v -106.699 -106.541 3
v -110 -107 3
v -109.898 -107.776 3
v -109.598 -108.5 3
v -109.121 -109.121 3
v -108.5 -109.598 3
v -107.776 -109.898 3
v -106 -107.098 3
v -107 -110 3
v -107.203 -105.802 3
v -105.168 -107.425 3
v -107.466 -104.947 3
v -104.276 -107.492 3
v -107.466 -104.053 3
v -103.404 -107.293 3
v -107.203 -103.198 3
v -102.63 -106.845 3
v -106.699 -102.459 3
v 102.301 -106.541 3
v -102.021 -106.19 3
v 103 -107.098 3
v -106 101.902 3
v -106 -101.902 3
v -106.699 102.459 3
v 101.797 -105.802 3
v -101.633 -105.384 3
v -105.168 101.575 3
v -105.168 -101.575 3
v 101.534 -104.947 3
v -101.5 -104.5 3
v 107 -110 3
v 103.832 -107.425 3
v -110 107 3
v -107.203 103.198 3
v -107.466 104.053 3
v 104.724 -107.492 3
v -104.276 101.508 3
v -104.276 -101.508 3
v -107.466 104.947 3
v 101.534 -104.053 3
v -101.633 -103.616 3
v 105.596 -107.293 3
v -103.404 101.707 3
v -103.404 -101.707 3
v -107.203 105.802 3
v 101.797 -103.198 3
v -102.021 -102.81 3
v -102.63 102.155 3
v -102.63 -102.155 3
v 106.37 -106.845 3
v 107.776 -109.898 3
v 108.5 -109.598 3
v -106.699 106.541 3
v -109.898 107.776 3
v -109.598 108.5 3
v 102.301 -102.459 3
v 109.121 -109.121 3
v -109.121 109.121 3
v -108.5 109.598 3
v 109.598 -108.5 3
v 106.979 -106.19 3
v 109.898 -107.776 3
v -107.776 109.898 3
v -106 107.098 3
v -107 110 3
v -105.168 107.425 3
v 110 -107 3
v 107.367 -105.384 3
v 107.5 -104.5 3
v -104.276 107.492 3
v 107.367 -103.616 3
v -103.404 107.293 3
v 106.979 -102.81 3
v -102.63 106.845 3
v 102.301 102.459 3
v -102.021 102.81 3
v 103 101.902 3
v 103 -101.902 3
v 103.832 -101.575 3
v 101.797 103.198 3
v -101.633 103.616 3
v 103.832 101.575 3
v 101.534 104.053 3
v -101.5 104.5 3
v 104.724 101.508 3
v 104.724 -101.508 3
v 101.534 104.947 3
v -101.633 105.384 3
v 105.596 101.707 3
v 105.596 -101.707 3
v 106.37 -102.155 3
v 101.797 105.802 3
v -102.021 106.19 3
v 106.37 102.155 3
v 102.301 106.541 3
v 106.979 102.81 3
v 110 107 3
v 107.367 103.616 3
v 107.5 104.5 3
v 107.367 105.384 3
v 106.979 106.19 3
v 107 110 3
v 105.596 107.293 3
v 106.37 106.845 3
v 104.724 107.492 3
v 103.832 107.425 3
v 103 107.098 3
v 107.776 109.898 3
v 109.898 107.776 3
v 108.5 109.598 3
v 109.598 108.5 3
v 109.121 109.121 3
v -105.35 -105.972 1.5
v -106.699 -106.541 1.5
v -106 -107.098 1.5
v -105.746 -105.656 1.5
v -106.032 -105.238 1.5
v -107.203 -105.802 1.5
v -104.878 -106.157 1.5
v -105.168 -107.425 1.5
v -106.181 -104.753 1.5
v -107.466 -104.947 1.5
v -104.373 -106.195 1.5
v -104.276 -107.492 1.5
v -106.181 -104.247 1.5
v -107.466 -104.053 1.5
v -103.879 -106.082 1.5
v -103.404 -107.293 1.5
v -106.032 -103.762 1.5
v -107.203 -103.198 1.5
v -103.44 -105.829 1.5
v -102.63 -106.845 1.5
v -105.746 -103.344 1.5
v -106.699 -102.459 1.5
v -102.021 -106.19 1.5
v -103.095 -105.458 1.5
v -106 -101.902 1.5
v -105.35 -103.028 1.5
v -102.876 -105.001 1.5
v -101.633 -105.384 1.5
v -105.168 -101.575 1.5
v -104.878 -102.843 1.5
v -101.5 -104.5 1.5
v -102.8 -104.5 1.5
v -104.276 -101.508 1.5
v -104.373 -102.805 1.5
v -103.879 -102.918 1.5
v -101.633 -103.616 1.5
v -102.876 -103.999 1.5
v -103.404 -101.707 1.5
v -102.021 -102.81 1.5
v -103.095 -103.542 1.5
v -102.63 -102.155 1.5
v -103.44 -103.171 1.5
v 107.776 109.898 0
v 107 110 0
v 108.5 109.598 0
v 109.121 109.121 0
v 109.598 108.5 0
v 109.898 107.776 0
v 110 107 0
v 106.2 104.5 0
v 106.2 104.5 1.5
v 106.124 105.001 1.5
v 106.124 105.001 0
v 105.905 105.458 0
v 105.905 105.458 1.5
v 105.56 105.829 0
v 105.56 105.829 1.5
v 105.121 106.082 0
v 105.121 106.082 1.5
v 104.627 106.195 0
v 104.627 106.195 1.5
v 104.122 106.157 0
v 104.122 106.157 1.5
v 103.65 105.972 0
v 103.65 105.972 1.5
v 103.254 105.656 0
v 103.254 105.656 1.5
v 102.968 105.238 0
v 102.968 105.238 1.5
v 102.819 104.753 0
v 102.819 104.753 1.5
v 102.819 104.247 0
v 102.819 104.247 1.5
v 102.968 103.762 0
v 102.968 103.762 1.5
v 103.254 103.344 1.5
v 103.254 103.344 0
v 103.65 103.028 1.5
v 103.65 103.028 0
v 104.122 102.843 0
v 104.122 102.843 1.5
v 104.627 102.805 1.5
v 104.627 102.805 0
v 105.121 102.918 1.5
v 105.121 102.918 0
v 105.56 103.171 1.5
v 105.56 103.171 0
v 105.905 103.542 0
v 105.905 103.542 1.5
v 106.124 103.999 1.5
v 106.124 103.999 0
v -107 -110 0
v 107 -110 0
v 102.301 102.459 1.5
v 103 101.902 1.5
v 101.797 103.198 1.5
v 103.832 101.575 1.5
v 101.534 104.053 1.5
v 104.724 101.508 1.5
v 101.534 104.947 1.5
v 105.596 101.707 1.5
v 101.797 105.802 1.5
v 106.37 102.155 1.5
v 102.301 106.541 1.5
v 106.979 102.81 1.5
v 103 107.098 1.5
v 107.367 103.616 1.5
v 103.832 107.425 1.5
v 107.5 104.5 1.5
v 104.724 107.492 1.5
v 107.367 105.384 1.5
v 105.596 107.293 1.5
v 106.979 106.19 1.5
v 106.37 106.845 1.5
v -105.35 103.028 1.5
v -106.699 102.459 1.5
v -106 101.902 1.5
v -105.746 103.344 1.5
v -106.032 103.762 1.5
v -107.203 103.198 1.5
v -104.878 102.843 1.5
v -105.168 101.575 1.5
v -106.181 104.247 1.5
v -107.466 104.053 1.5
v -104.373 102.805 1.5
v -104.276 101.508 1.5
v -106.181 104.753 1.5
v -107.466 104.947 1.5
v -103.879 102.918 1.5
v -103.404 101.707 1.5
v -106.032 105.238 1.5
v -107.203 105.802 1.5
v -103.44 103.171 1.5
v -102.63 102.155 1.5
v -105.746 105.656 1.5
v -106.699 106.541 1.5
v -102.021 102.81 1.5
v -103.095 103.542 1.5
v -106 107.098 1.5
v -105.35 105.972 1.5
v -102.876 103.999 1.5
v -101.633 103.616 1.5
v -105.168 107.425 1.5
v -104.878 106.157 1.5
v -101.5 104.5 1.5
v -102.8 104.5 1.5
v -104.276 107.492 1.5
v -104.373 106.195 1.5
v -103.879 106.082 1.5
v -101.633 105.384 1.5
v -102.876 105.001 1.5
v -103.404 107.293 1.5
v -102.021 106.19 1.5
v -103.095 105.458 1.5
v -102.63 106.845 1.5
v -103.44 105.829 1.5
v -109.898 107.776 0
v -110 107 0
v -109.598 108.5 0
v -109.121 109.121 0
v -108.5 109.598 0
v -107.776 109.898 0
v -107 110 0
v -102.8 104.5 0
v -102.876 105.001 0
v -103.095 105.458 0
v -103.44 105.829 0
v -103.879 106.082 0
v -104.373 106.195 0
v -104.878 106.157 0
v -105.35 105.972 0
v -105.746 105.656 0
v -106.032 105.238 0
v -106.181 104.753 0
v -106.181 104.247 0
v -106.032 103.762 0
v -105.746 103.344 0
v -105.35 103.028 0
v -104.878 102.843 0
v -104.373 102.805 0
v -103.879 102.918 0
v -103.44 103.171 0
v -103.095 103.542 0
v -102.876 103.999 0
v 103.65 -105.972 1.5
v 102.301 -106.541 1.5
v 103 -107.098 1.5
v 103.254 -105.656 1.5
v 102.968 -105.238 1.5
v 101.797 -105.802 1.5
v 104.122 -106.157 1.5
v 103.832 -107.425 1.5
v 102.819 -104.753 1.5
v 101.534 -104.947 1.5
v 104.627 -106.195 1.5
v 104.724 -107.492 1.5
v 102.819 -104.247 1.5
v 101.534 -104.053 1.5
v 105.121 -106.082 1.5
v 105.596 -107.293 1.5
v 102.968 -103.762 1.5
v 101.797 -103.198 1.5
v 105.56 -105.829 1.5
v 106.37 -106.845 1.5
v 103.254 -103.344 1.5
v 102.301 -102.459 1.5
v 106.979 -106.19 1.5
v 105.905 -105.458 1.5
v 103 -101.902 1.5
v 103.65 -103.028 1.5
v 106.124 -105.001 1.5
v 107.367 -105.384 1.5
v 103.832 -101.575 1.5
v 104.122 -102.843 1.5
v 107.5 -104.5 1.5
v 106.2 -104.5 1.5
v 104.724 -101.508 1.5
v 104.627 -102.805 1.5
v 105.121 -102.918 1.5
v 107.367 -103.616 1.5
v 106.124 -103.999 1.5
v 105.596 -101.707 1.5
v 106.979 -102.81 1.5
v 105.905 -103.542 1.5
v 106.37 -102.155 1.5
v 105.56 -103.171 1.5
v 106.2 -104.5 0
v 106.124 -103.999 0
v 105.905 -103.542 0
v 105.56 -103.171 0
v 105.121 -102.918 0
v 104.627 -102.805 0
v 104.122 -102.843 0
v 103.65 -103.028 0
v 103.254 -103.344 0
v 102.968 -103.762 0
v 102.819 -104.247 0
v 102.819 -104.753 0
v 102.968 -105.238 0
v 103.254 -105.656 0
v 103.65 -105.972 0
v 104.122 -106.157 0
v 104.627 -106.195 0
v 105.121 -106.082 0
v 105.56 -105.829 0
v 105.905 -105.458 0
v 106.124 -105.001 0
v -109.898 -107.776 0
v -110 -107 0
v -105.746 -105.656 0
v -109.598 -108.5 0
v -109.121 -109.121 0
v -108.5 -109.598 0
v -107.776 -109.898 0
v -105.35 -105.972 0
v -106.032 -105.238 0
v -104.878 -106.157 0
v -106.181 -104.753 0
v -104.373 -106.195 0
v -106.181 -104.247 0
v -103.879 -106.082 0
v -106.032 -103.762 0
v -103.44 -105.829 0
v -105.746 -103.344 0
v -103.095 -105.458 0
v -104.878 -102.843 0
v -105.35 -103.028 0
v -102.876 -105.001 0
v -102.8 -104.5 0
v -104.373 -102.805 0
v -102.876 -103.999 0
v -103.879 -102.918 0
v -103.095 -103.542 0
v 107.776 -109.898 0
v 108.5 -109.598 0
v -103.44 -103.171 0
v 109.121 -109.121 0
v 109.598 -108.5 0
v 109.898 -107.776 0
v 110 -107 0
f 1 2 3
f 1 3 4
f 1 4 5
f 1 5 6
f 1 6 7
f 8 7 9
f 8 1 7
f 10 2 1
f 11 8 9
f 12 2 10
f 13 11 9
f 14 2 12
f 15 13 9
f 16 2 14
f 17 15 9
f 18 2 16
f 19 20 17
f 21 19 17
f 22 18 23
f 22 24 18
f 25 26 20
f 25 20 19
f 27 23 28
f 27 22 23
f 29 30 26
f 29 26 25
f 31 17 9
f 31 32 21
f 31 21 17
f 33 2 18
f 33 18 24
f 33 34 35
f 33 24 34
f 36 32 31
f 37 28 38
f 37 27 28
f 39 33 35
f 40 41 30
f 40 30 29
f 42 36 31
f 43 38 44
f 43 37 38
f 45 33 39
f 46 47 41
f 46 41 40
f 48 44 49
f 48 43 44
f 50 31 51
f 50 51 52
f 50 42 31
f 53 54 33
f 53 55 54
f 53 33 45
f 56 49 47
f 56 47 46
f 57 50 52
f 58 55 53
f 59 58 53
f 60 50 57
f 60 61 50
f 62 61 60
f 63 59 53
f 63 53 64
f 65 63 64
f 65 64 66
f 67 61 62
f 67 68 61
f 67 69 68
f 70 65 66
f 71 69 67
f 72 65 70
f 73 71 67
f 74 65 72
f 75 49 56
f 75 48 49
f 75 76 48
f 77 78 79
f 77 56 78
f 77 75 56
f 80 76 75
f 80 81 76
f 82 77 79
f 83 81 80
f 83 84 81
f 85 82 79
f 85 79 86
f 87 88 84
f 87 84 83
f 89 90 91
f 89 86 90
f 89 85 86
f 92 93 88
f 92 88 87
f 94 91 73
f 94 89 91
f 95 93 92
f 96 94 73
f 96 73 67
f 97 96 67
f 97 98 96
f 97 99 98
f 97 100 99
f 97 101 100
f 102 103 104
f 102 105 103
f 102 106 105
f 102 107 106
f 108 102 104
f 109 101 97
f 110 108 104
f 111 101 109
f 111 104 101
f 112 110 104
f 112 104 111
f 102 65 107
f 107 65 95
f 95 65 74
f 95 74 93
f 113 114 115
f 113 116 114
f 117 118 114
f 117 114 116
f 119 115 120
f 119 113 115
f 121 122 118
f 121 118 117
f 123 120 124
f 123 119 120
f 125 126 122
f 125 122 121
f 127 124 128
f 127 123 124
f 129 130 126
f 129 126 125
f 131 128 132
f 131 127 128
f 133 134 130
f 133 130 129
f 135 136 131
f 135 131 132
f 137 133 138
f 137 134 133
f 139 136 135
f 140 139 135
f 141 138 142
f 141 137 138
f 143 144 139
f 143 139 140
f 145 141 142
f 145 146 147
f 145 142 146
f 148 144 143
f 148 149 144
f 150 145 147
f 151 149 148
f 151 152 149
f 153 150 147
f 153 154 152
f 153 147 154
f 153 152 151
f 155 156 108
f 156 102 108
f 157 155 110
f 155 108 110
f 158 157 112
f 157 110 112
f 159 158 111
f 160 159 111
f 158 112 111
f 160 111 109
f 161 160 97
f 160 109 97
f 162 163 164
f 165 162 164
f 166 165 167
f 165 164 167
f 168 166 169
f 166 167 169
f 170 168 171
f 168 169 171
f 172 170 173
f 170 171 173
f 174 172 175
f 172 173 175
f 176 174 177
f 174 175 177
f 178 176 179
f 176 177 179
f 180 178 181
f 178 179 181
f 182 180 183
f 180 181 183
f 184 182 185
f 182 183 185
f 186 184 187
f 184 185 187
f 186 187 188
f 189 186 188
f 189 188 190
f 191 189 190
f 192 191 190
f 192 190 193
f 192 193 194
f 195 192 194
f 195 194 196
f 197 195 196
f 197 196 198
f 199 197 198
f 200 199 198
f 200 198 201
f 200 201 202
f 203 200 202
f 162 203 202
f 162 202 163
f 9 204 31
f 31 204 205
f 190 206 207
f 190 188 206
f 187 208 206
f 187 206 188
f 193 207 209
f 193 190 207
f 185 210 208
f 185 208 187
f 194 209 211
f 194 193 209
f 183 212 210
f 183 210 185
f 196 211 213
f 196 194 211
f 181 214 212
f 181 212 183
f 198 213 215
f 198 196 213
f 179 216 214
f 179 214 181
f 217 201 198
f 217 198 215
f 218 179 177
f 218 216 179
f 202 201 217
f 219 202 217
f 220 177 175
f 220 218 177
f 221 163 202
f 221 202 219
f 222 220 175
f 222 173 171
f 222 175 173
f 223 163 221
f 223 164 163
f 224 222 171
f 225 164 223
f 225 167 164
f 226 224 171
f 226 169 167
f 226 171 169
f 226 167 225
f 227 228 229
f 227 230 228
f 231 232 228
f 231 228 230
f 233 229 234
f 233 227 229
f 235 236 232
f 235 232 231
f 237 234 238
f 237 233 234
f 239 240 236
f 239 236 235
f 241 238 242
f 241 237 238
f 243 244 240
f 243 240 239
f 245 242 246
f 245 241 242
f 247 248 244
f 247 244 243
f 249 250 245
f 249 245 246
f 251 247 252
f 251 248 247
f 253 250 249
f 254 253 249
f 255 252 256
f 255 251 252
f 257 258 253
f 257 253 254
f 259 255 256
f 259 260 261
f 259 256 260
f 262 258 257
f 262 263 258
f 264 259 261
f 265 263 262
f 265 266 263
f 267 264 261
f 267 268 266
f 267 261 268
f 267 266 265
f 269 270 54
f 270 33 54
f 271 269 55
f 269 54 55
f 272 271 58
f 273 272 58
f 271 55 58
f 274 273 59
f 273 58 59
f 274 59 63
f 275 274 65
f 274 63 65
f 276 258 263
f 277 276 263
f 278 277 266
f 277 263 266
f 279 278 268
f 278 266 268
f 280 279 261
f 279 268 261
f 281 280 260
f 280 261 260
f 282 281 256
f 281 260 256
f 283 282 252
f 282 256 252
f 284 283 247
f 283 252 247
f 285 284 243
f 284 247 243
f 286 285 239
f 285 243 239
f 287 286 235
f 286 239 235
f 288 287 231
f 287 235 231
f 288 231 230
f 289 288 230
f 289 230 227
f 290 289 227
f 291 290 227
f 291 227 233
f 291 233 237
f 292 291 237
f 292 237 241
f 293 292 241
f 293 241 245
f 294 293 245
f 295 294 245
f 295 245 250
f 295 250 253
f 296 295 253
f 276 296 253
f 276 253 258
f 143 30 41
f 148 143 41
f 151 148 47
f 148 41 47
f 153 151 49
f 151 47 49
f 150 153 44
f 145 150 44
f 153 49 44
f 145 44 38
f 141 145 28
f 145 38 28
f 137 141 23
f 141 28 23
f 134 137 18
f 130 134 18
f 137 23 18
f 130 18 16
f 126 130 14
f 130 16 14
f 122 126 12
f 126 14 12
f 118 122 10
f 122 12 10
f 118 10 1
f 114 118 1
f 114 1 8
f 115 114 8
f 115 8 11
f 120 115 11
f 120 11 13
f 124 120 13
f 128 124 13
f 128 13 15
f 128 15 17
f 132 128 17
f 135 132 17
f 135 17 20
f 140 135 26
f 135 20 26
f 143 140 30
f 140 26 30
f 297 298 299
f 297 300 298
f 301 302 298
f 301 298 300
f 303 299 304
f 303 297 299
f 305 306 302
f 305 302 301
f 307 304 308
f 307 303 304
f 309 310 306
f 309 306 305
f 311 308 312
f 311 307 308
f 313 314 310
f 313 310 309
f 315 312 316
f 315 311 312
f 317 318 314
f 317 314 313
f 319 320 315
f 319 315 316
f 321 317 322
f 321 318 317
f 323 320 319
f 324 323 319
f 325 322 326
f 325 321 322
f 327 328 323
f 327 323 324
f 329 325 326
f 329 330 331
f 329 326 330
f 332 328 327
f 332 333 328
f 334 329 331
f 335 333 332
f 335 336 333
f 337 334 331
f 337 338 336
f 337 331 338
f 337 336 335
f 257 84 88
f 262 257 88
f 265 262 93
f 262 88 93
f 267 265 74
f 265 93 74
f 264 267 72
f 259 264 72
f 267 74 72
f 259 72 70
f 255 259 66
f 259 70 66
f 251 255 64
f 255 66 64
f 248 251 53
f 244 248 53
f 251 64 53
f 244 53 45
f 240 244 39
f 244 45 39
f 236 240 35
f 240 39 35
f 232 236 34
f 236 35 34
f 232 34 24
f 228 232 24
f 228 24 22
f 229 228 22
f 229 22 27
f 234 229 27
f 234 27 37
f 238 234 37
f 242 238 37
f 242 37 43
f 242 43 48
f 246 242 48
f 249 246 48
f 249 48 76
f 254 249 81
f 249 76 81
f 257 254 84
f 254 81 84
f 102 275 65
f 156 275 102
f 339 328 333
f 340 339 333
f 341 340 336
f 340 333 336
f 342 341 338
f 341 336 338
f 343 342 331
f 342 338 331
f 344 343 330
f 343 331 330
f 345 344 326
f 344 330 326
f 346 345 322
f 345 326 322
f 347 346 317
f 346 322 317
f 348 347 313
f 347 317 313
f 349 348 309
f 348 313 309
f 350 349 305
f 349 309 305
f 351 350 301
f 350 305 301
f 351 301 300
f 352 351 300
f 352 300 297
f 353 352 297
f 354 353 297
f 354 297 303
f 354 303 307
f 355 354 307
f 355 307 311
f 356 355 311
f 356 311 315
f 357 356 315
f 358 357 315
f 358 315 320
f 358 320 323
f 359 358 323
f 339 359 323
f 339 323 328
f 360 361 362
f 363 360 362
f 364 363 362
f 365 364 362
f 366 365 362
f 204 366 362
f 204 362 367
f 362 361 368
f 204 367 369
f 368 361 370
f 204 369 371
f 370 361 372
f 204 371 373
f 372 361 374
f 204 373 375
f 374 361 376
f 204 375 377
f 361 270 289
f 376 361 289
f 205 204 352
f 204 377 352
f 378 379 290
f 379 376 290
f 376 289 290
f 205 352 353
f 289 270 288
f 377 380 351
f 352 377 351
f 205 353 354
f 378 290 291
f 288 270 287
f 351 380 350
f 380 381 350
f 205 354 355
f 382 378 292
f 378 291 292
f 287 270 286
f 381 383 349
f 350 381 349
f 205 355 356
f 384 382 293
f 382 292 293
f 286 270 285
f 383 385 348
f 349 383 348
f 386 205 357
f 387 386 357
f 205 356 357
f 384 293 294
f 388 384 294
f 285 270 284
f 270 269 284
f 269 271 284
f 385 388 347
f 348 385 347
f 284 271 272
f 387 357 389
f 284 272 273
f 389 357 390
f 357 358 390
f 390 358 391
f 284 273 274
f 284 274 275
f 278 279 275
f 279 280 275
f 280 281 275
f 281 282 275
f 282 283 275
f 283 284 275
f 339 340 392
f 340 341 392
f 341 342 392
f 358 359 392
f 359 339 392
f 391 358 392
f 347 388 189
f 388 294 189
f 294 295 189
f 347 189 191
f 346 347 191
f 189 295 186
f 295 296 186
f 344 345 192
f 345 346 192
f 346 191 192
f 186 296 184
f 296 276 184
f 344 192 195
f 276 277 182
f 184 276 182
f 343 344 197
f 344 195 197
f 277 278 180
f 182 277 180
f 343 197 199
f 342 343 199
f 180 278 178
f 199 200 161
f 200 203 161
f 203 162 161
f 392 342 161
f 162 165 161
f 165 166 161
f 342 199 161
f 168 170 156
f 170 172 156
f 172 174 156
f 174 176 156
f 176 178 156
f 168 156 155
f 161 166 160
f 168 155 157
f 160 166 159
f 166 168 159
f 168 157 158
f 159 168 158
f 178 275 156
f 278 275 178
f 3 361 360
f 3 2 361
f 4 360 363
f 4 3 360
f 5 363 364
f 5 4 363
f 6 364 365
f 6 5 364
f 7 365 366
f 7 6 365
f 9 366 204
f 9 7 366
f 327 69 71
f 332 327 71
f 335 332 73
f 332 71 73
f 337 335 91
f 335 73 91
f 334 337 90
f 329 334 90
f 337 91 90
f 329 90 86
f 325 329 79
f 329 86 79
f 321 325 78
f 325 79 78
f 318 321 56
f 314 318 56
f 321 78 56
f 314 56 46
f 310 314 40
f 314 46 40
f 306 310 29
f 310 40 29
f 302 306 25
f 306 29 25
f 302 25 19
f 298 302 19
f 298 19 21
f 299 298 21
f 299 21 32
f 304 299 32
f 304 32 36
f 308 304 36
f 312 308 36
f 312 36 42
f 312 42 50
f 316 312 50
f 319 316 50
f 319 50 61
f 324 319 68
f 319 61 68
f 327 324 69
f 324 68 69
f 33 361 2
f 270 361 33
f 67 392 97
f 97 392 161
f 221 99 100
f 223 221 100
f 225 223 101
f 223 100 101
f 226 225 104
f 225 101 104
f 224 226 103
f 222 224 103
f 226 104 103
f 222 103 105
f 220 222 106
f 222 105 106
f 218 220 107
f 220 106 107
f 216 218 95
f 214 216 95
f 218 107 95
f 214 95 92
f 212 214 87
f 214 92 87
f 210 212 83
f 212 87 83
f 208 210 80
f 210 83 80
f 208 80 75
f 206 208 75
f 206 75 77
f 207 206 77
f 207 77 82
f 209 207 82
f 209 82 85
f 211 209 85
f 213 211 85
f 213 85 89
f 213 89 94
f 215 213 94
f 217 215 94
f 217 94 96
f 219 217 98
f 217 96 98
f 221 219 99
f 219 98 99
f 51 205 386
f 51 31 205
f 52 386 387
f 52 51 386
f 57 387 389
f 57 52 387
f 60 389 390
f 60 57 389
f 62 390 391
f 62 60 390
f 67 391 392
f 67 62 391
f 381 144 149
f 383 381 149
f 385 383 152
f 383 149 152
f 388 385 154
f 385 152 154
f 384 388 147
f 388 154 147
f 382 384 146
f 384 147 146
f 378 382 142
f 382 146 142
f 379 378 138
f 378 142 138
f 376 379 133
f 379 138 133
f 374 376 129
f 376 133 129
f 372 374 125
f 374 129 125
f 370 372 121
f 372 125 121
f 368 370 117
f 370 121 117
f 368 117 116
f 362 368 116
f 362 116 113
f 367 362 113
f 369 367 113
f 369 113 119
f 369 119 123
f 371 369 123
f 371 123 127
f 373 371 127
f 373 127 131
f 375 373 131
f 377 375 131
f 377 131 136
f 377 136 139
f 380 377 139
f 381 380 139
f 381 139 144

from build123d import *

# Parameters (mm, degrees)
SKETCH_W        = 220
SKETCH_H        = 220
PAD_DEPTH       = 3
SKETCH001_R     = 1.7
POCKET_DEPTH    = 3.001
SKETCH002_R     = 3
POCKET001_DEPTH = 1.5
FILLET_R        = 3


with BuildPart() as part:
    # Sketch → Pad (new body)
    with BuildSketch(Plane.XY):
        Rectangle(SKETCH_W, SKETCH_H)
    extrude(amount=PAD_DEPTH)

    # Sketch001 (on Face6 of Pad) → Pocket (cut, through all)
    with BuildSketch(Plane.XY.offset(3)):
        with Locations((-104.5, 104.5)):
            Circle(SKETCH001_R)
        with Locations((-104.5, -104.5)):
            Circle(SKETCH001_R)
        with Locations((104.5, -104.5)):
            Circle(SKETCH001_R)
        with Locations((104.5, 104.5)):
            Circle(SKETCH001_R)
    extrude(amount=-POCKET_DEPTH, mode=Mode.SUBTRACT)

    # Sketch002 (on Face5 of Pocket) → Pocket001 (cut)
    with BuildSketch(Plane.XY.offset(3)):
        with Locations((-104.5, 104.5)):
            Circle(SKETCH002_R)
        with Locations((-104.5, -104.5)):
            Circle(SKETCH002_R)
        with Locations((104.5, -104.5)):
            Circle(SKETCH002_R)
        with Locations((104.5, 104.5)):
            Circle(SKETCH002_R)
    extrude(amount=-POCKET001_DEPTH, mode=Mode.SUBTRACT)

    # Fillet
    fillet_edges = [part.edges().sort_by_distance(p)[0] for p in [
        (-110, 110, 1.5),
        (-110, -110, 1.5),
        (110, -110, 1.5),
        (110, 110, 1.5),
    ]]
    fillet(fillet_edges, radius=FILLET_R)


solid = part.part
